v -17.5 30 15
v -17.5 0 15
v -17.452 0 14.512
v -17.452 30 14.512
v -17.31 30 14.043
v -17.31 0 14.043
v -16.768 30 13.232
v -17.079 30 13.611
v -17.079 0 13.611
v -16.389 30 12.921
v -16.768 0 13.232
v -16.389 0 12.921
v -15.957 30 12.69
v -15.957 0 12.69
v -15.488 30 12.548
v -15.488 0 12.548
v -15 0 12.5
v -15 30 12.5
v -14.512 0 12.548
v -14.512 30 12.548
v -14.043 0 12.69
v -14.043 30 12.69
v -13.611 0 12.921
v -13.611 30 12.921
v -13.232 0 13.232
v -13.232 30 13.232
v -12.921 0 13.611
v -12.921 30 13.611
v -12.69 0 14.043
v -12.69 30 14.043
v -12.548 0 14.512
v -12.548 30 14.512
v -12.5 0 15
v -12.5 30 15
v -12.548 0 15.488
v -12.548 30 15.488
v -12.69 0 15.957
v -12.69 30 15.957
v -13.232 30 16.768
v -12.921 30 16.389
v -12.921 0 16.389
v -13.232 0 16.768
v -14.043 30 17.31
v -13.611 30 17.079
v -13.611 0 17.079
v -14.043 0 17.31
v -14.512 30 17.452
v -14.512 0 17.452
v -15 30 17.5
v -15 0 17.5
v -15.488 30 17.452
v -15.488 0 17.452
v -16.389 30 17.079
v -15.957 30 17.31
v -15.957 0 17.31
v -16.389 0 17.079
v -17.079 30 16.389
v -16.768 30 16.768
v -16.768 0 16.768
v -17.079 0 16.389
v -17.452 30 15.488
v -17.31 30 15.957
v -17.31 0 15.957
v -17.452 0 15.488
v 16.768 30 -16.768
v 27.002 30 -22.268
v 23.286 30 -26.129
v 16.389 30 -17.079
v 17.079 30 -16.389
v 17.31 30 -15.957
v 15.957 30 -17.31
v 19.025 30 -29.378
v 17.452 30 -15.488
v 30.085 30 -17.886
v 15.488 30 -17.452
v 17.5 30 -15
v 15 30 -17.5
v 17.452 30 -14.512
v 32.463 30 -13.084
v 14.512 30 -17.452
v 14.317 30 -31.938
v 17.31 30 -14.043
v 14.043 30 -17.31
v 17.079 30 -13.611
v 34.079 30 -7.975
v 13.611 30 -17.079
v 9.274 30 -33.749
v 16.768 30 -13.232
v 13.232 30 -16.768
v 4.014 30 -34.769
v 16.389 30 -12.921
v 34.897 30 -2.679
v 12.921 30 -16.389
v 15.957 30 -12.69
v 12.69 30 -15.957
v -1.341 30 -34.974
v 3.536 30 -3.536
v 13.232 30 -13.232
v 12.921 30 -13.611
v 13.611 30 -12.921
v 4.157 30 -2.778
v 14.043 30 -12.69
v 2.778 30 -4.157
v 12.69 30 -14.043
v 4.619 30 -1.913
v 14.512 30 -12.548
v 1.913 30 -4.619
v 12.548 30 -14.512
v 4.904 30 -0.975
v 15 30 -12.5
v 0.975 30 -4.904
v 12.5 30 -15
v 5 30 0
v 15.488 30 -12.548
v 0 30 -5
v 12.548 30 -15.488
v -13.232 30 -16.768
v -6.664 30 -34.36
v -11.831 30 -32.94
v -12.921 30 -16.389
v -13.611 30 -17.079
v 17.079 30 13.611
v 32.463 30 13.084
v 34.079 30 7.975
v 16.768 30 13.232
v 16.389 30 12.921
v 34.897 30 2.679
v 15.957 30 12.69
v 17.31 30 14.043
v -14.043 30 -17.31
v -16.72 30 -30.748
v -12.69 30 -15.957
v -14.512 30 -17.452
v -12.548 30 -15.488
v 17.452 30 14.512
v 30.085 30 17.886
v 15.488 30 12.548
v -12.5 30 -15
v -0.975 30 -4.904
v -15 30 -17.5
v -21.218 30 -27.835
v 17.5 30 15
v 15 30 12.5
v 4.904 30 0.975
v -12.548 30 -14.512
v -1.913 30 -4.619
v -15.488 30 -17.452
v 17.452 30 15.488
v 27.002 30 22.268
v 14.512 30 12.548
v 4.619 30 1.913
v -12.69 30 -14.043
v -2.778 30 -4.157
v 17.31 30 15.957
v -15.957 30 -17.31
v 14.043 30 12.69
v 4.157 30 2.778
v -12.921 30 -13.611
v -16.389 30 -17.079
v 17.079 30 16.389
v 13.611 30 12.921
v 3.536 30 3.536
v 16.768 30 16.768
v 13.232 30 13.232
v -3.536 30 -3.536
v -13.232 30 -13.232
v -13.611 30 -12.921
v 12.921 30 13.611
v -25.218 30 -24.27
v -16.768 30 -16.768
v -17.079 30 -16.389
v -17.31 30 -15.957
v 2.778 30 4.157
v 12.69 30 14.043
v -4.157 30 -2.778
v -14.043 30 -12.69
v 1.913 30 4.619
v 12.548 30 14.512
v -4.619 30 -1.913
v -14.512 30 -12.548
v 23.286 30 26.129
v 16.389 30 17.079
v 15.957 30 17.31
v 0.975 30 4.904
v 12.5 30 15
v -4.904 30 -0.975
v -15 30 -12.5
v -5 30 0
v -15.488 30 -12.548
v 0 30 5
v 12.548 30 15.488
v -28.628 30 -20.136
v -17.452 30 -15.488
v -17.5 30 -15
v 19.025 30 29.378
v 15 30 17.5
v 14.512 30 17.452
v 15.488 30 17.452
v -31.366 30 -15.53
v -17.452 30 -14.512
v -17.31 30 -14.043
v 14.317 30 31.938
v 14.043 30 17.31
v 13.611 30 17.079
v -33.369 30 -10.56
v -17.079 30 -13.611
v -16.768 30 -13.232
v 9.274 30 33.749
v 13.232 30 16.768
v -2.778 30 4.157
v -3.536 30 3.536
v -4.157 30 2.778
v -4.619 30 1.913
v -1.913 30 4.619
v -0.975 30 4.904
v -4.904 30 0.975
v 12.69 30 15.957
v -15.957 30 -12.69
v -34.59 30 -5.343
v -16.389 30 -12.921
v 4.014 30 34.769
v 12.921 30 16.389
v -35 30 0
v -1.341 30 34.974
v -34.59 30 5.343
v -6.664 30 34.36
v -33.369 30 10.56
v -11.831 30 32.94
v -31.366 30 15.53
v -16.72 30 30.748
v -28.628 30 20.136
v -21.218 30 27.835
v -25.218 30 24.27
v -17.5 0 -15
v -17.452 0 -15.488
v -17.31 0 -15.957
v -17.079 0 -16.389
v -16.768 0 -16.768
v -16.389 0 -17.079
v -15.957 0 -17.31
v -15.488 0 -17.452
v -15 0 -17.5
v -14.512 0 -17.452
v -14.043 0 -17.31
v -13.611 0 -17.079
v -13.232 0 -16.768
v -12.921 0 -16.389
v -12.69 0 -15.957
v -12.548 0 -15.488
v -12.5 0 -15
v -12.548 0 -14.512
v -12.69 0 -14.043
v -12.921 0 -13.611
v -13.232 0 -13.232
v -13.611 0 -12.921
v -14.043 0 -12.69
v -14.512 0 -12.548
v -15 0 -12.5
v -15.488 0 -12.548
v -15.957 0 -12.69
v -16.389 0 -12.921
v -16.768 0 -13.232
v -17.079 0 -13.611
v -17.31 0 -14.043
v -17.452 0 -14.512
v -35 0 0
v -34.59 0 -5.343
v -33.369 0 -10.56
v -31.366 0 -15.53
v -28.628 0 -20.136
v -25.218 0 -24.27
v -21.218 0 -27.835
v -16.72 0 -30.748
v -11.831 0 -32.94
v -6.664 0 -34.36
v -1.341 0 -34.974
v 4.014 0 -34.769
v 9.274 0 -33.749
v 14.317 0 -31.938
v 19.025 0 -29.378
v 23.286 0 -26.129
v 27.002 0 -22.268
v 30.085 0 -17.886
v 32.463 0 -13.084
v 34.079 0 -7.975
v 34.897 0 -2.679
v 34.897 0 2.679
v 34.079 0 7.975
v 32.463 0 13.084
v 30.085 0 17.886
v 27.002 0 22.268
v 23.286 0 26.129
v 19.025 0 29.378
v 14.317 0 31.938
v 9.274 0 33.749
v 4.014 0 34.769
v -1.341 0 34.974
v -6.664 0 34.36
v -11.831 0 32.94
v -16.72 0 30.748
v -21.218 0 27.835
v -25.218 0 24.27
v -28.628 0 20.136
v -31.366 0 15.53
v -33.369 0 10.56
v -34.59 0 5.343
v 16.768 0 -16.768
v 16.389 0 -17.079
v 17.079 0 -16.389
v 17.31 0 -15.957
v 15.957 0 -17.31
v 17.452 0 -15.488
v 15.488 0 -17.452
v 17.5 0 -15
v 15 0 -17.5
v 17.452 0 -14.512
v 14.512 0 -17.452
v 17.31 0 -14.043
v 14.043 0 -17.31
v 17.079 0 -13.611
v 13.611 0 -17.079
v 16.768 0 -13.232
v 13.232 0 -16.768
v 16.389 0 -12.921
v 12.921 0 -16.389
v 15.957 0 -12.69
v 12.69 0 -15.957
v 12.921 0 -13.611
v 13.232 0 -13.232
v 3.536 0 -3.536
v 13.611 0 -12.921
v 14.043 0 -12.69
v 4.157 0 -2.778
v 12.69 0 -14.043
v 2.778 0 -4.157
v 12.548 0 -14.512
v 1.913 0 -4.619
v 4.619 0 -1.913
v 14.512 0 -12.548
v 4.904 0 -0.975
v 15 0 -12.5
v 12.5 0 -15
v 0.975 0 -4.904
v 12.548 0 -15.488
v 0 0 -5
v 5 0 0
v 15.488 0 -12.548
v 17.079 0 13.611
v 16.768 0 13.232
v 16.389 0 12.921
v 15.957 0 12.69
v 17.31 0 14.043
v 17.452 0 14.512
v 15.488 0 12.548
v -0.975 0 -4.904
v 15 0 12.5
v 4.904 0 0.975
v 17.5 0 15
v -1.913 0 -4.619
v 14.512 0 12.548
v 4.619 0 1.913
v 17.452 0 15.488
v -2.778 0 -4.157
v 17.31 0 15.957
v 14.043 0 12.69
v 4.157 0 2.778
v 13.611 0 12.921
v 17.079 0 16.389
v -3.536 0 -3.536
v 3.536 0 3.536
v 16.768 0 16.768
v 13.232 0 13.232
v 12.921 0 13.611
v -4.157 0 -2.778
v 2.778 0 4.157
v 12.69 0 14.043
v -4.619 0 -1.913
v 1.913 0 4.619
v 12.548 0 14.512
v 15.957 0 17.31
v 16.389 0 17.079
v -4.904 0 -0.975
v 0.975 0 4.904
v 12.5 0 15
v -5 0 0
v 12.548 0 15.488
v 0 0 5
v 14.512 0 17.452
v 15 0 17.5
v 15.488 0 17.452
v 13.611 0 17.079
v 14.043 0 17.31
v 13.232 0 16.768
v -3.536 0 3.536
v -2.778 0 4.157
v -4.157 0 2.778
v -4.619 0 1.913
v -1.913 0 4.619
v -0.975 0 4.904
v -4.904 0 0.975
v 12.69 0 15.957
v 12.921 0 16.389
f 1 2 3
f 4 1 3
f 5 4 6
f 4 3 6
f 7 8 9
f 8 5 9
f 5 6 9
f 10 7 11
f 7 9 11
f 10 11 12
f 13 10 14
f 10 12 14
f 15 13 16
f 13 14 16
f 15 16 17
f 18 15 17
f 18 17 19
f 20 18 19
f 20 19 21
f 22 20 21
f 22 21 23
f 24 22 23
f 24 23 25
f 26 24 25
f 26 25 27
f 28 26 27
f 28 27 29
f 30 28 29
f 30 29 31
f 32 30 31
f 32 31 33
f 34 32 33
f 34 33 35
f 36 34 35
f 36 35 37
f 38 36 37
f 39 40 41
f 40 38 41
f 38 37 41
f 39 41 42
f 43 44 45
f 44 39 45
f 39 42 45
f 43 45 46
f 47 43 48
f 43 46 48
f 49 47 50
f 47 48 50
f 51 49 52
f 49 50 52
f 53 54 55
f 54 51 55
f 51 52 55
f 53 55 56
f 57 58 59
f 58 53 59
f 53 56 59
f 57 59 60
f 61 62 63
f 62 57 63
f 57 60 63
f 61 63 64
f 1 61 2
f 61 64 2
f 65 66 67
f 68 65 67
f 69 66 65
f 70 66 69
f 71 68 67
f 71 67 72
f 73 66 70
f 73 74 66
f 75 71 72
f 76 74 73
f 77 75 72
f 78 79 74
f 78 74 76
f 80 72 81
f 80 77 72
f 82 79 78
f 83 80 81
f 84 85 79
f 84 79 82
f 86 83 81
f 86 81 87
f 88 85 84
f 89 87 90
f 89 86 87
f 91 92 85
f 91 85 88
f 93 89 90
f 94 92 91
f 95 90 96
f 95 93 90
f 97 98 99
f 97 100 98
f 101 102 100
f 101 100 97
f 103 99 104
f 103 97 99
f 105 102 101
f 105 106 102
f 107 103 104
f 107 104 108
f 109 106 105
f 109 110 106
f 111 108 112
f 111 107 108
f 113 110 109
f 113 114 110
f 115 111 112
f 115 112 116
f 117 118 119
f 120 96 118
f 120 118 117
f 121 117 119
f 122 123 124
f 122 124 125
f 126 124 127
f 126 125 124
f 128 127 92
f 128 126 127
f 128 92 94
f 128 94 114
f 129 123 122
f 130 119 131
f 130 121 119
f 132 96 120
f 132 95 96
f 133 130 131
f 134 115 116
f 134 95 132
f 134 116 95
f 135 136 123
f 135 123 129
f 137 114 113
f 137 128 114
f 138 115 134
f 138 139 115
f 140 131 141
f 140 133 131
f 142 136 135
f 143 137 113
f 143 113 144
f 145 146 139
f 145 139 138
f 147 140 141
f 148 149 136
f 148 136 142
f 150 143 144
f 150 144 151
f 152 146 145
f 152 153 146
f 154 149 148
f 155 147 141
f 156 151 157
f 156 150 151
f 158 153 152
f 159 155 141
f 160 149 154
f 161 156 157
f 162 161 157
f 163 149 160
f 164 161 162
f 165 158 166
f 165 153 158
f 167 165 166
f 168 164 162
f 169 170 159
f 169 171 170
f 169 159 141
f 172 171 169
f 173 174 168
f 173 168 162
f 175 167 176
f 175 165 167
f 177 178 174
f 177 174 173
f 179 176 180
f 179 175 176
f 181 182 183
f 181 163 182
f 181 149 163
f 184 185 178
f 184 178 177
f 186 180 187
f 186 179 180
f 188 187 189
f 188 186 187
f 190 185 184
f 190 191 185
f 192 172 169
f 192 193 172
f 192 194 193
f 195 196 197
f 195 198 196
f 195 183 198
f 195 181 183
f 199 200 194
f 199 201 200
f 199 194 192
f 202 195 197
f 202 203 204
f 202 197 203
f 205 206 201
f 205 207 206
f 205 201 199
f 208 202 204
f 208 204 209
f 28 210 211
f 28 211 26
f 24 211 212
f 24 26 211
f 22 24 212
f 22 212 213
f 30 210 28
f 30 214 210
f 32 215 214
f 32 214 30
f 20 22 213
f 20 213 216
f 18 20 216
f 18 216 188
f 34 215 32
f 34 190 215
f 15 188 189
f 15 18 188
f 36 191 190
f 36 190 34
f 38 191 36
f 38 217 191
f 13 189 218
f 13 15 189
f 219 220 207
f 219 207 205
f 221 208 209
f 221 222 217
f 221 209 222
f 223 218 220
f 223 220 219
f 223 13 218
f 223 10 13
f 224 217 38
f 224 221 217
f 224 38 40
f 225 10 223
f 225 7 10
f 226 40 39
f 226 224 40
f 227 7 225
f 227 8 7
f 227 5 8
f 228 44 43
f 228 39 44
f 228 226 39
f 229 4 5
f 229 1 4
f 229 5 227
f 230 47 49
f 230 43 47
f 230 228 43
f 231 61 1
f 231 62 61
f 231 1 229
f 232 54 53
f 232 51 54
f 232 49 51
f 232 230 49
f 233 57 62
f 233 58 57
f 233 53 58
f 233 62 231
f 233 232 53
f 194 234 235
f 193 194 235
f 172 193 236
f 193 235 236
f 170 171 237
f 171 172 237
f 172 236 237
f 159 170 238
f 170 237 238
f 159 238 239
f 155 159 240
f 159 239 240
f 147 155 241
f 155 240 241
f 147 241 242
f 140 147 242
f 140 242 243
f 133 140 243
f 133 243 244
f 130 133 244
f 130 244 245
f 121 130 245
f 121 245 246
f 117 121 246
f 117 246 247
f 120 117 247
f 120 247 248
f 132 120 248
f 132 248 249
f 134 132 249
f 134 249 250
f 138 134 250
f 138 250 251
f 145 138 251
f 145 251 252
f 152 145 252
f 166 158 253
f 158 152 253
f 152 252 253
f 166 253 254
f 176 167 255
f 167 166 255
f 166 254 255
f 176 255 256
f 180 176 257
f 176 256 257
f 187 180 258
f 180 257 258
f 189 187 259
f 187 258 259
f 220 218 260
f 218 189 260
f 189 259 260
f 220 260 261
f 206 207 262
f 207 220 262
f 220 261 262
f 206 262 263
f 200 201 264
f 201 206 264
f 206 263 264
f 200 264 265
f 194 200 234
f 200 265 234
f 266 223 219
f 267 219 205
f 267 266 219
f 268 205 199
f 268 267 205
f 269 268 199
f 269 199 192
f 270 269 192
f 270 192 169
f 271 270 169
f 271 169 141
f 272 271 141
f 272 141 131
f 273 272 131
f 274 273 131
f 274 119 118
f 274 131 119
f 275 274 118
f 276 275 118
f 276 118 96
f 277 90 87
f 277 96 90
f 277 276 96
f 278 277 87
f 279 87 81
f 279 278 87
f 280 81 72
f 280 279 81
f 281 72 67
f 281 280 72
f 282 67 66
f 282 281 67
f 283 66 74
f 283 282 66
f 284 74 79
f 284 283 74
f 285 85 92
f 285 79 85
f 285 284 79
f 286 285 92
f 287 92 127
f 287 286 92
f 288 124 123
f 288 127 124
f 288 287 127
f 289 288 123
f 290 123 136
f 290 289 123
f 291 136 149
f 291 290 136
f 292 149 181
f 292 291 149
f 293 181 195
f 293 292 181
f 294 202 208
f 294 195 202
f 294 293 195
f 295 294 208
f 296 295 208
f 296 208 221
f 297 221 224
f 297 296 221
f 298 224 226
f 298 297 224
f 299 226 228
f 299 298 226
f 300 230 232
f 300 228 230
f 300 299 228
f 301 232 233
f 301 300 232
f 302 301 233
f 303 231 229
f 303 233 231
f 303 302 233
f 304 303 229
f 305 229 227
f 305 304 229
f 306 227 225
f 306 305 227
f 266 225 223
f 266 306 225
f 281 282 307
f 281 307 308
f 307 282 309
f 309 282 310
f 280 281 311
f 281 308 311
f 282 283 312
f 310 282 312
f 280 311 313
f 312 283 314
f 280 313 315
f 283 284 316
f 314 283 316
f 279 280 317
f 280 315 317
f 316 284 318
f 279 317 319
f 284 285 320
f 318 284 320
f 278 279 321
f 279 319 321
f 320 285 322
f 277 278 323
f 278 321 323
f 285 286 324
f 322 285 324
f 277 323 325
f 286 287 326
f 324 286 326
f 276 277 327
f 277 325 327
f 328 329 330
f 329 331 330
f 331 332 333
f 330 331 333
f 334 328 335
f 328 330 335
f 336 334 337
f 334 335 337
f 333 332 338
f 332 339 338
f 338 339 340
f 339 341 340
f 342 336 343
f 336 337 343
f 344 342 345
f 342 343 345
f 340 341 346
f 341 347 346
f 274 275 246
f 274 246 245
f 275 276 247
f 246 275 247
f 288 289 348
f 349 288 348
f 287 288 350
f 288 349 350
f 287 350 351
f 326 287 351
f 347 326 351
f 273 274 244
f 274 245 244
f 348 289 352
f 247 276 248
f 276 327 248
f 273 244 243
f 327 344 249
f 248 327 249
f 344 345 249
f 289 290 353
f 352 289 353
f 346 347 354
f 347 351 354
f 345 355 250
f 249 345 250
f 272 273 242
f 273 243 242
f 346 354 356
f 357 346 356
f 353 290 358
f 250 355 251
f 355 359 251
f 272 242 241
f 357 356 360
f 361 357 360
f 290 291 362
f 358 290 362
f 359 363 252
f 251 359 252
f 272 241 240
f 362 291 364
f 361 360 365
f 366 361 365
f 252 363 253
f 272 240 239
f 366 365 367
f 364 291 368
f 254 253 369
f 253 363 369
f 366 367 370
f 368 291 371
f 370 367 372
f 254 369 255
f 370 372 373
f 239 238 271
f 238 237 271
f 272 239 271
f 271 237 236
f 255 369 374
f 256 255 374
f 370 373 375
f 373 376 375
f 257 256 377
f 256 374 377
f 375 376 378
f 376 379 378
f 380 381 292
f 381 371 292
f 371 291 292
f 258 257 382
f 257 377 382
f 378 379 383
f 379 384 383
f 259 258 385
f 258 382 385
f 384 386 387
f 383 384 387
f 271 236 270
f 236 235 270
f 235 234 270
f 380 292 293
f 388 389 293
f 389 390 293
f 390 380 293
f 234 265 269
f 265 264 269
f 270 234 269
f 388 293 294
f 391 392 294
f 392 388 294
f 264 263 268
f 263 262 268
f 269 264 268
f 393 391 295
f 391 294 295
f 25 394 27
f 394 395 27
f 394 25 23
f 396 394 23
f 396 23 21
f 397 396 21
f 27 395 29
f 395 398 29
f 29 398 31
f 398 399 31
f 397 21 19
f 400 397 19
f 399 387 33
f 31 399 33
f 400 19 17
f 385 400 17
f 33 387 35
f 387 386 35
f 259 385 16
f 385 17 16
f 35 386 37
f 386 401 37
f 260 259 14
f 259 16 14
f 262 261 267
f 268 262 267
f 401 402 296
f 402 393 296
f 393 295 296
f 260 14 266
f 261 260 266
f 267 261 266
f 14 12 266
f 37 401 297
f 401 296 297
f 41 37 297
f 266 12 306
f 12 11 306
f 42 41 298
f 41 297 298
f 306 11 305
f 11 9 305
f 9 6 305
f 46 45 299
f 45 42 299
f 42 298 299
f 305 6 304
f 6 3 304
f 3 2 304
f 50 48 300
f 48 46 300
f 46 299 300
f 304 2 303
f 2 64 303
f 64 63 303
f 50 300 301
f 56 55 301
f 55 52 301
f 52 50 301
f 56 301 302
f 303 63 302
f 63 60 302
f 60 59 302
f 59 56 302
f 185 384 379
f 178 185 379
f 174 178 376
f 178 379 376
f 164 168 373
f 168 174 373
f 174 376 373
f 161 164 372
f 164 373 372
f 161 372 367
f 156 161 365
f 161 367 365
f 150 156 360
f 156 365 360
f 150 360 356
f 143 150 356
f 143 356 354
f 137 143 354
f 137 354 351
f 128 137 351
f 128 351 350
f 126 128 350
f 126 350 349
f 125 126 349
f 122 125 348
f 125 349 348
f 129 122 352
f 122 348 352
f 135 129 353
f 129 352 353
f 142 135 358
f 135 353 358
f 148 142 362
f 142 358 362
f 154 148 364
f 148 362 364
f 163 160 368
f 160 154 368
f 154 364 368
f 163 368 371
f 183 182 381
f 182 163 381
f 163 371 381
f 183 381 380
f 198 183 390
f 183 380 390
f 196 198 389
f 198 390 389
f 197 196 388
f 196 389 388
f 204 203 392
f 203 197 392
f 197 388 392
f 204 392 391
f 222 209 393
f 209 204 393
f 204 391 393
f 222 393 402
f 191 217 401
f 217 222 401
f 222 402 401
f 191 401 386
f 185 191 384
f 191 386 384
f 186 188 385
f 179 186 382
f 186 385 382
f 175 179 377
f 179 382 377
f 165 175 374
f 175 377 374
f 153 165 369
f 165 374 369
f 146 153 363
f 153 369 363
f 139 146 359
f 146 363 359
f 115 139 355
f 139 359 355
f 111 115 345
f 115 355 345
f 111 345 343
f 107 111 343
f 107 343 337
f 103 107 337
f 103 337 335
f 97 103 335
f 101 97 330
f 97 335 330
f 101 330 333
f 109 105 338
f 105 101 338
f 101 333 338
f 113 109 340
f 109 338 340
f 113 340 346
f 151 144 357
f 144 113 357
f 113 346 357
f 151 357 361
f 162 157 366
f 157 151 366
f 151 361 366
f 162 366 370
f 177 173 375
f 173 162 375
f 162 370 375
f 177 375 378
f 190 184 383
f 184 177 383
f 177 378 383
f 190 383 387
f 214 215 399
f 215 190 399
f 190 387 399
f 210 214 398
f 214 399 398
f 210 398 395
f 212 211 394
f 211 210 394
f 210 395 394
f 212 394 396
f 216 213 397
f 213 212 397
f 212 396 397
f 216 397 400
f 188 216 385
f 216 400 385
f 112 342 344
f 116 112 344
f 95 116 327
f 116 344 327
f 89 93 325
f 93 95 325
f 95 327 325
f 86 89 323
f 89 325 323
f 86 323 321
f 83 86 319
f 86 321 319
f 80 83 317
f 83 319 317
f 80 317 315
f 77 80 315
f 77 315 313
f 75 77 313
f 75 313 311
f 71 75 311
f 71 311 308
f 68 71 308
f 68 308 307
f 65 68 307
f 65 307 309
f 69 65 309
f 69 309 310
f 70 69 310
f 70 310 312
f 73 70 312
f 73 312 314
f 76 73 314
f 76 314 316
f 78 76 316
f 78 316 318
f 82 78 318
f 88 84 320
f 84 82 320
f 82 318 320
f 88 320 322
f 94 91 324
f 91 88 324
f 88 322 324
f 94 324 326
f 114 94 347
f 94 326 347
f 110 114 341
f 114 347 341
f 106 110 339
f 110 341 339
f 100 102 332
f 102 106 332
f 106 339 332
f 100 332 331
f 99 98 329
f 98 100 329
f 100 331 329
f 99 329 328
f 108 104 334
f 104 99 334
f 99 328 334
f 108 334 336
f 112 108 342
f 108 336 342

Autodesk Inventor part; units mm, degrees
ref_plane "YZ Plane" through (0, 0, 0) normal (1, 0, 0) x (0, 1, 0)
ref_plane "XZ Plane" through (0, 0, 0) normal (0, 1, 0) x (-1, 0, 0)
ref_plane "XY Plane" through (0, 0, 0) normal (0, 0, 1) x (1, 0, 0)
sketch "Block1" plane through (0, 0, 0) normal (0, 0, 1) x (1, 0, 0)
  circle A0 centre (0, 0) radius 50.22
  circle A1 centre (-30, -32.5) radius 2.72
  circle A2 centre (30, -32.5) radius 2.72
  circle A3 centre (0, 0) radius 5.22
  circle A4 centre (-30, 32.5) radius 2.72
  circle A5 centre (30, 32.5) radius 2.72
sketch "Block2" plane through (0, 0, 0) normal (0, 0, 1) x (1, 0, 0)
  circle A0 centre (0, 0) radius 35.22
  circle A1 centre (0, 0) radius 5.22
  circle A2 centre (20, 20) radius 2.72
  circle A3 centre (-20, 20) radius 2.72
  circle A4 centre (-20, -20) radius 2.72
  circle A5 centre (20, -20) radius 2.72
  point P0 (0, 0)
sketch "Block3" plane through (0, 0, 0) normal (0, 0, 1) x (1, 0, 0)
  circle A0 centre (0, 0) radius 35.22
  circle A1 centre (-15, 17.5) radius 2.72
  circle A2 centre (0, 0) radius 5.22
  circle A3 centre (-15, -17.5) radius 2.72
  circle A4 centre (15, 17.5) radius 2.72
  circle A5 centre (15, -17.5) radius 2.72
sketch "Block4" plane through (0, 0, 0) normal (0, 0, 1) x (1, 0, 0)
  circle A0 centre (0, 0) radius 35.22
  circle A1 centre (-15, 15) radius 2.72
  circle A2 centre (-15, -15) radius 2.72
  circle A3 centre (0, 0) radius 5.22
  circle A4 centre (15, 15) radius 2.72
  circle A5 centre (15, -15) radius 2.72
sketch "Sketch1" plane through (0, 0, 0) normal (0, 1, 0) x (-1, 0, 0)
  circle A0 centre (0, 0) radius 35
  line L0 (49, 0) -> (-49, 0) projected
  line L1 (0, -49) -> (0, 49) projected
  circle A1 centre (-15, -15) radius 2.5
  circle A2 centre (15, -15) radius 2.5
  circle A3 centre (-15, 15) radius 2.5
  circle A4 centre (15, 15) radius 2.5
  circle A5 centre (0, 0) radius 5
  dimension "d0" = 70
  dimension "d29" = 5
  dimension "d30" = 15
  dimension "d31" = 15
  dimension "d34" = 10
extrude "Extrusion5" add sketch "Sketch1" along normal blind 30 contours L0 A5 L1 A0 | A0 L1 A5 L0 | L1 A5 L0 A0 | A0 L0 A5 L1
sketch "Sketch9" plane through (0, 0, 0) normal (0, -1, 0) x (1, 0, 0)
  circle A0 centre (0, 0) radius 5 projected
  circle A1 centre (-15, 15) radius 2.5 projected
  circle A2 centre (15, 15) radius 2.5 projected
  circle A3 centre (-15, -15) radius 2.5 projected
  circle A4 centre (15, -15) radius 2.5 projected
  circle A5 centre (0, 0) radius 35 projected
sketch "DXF" plane through (0, 0, 0) normal (0, 1, 0) x (-1, 0, 0)
  point P0 (0, 0)
properties part number "drivepulleyMiddle"
